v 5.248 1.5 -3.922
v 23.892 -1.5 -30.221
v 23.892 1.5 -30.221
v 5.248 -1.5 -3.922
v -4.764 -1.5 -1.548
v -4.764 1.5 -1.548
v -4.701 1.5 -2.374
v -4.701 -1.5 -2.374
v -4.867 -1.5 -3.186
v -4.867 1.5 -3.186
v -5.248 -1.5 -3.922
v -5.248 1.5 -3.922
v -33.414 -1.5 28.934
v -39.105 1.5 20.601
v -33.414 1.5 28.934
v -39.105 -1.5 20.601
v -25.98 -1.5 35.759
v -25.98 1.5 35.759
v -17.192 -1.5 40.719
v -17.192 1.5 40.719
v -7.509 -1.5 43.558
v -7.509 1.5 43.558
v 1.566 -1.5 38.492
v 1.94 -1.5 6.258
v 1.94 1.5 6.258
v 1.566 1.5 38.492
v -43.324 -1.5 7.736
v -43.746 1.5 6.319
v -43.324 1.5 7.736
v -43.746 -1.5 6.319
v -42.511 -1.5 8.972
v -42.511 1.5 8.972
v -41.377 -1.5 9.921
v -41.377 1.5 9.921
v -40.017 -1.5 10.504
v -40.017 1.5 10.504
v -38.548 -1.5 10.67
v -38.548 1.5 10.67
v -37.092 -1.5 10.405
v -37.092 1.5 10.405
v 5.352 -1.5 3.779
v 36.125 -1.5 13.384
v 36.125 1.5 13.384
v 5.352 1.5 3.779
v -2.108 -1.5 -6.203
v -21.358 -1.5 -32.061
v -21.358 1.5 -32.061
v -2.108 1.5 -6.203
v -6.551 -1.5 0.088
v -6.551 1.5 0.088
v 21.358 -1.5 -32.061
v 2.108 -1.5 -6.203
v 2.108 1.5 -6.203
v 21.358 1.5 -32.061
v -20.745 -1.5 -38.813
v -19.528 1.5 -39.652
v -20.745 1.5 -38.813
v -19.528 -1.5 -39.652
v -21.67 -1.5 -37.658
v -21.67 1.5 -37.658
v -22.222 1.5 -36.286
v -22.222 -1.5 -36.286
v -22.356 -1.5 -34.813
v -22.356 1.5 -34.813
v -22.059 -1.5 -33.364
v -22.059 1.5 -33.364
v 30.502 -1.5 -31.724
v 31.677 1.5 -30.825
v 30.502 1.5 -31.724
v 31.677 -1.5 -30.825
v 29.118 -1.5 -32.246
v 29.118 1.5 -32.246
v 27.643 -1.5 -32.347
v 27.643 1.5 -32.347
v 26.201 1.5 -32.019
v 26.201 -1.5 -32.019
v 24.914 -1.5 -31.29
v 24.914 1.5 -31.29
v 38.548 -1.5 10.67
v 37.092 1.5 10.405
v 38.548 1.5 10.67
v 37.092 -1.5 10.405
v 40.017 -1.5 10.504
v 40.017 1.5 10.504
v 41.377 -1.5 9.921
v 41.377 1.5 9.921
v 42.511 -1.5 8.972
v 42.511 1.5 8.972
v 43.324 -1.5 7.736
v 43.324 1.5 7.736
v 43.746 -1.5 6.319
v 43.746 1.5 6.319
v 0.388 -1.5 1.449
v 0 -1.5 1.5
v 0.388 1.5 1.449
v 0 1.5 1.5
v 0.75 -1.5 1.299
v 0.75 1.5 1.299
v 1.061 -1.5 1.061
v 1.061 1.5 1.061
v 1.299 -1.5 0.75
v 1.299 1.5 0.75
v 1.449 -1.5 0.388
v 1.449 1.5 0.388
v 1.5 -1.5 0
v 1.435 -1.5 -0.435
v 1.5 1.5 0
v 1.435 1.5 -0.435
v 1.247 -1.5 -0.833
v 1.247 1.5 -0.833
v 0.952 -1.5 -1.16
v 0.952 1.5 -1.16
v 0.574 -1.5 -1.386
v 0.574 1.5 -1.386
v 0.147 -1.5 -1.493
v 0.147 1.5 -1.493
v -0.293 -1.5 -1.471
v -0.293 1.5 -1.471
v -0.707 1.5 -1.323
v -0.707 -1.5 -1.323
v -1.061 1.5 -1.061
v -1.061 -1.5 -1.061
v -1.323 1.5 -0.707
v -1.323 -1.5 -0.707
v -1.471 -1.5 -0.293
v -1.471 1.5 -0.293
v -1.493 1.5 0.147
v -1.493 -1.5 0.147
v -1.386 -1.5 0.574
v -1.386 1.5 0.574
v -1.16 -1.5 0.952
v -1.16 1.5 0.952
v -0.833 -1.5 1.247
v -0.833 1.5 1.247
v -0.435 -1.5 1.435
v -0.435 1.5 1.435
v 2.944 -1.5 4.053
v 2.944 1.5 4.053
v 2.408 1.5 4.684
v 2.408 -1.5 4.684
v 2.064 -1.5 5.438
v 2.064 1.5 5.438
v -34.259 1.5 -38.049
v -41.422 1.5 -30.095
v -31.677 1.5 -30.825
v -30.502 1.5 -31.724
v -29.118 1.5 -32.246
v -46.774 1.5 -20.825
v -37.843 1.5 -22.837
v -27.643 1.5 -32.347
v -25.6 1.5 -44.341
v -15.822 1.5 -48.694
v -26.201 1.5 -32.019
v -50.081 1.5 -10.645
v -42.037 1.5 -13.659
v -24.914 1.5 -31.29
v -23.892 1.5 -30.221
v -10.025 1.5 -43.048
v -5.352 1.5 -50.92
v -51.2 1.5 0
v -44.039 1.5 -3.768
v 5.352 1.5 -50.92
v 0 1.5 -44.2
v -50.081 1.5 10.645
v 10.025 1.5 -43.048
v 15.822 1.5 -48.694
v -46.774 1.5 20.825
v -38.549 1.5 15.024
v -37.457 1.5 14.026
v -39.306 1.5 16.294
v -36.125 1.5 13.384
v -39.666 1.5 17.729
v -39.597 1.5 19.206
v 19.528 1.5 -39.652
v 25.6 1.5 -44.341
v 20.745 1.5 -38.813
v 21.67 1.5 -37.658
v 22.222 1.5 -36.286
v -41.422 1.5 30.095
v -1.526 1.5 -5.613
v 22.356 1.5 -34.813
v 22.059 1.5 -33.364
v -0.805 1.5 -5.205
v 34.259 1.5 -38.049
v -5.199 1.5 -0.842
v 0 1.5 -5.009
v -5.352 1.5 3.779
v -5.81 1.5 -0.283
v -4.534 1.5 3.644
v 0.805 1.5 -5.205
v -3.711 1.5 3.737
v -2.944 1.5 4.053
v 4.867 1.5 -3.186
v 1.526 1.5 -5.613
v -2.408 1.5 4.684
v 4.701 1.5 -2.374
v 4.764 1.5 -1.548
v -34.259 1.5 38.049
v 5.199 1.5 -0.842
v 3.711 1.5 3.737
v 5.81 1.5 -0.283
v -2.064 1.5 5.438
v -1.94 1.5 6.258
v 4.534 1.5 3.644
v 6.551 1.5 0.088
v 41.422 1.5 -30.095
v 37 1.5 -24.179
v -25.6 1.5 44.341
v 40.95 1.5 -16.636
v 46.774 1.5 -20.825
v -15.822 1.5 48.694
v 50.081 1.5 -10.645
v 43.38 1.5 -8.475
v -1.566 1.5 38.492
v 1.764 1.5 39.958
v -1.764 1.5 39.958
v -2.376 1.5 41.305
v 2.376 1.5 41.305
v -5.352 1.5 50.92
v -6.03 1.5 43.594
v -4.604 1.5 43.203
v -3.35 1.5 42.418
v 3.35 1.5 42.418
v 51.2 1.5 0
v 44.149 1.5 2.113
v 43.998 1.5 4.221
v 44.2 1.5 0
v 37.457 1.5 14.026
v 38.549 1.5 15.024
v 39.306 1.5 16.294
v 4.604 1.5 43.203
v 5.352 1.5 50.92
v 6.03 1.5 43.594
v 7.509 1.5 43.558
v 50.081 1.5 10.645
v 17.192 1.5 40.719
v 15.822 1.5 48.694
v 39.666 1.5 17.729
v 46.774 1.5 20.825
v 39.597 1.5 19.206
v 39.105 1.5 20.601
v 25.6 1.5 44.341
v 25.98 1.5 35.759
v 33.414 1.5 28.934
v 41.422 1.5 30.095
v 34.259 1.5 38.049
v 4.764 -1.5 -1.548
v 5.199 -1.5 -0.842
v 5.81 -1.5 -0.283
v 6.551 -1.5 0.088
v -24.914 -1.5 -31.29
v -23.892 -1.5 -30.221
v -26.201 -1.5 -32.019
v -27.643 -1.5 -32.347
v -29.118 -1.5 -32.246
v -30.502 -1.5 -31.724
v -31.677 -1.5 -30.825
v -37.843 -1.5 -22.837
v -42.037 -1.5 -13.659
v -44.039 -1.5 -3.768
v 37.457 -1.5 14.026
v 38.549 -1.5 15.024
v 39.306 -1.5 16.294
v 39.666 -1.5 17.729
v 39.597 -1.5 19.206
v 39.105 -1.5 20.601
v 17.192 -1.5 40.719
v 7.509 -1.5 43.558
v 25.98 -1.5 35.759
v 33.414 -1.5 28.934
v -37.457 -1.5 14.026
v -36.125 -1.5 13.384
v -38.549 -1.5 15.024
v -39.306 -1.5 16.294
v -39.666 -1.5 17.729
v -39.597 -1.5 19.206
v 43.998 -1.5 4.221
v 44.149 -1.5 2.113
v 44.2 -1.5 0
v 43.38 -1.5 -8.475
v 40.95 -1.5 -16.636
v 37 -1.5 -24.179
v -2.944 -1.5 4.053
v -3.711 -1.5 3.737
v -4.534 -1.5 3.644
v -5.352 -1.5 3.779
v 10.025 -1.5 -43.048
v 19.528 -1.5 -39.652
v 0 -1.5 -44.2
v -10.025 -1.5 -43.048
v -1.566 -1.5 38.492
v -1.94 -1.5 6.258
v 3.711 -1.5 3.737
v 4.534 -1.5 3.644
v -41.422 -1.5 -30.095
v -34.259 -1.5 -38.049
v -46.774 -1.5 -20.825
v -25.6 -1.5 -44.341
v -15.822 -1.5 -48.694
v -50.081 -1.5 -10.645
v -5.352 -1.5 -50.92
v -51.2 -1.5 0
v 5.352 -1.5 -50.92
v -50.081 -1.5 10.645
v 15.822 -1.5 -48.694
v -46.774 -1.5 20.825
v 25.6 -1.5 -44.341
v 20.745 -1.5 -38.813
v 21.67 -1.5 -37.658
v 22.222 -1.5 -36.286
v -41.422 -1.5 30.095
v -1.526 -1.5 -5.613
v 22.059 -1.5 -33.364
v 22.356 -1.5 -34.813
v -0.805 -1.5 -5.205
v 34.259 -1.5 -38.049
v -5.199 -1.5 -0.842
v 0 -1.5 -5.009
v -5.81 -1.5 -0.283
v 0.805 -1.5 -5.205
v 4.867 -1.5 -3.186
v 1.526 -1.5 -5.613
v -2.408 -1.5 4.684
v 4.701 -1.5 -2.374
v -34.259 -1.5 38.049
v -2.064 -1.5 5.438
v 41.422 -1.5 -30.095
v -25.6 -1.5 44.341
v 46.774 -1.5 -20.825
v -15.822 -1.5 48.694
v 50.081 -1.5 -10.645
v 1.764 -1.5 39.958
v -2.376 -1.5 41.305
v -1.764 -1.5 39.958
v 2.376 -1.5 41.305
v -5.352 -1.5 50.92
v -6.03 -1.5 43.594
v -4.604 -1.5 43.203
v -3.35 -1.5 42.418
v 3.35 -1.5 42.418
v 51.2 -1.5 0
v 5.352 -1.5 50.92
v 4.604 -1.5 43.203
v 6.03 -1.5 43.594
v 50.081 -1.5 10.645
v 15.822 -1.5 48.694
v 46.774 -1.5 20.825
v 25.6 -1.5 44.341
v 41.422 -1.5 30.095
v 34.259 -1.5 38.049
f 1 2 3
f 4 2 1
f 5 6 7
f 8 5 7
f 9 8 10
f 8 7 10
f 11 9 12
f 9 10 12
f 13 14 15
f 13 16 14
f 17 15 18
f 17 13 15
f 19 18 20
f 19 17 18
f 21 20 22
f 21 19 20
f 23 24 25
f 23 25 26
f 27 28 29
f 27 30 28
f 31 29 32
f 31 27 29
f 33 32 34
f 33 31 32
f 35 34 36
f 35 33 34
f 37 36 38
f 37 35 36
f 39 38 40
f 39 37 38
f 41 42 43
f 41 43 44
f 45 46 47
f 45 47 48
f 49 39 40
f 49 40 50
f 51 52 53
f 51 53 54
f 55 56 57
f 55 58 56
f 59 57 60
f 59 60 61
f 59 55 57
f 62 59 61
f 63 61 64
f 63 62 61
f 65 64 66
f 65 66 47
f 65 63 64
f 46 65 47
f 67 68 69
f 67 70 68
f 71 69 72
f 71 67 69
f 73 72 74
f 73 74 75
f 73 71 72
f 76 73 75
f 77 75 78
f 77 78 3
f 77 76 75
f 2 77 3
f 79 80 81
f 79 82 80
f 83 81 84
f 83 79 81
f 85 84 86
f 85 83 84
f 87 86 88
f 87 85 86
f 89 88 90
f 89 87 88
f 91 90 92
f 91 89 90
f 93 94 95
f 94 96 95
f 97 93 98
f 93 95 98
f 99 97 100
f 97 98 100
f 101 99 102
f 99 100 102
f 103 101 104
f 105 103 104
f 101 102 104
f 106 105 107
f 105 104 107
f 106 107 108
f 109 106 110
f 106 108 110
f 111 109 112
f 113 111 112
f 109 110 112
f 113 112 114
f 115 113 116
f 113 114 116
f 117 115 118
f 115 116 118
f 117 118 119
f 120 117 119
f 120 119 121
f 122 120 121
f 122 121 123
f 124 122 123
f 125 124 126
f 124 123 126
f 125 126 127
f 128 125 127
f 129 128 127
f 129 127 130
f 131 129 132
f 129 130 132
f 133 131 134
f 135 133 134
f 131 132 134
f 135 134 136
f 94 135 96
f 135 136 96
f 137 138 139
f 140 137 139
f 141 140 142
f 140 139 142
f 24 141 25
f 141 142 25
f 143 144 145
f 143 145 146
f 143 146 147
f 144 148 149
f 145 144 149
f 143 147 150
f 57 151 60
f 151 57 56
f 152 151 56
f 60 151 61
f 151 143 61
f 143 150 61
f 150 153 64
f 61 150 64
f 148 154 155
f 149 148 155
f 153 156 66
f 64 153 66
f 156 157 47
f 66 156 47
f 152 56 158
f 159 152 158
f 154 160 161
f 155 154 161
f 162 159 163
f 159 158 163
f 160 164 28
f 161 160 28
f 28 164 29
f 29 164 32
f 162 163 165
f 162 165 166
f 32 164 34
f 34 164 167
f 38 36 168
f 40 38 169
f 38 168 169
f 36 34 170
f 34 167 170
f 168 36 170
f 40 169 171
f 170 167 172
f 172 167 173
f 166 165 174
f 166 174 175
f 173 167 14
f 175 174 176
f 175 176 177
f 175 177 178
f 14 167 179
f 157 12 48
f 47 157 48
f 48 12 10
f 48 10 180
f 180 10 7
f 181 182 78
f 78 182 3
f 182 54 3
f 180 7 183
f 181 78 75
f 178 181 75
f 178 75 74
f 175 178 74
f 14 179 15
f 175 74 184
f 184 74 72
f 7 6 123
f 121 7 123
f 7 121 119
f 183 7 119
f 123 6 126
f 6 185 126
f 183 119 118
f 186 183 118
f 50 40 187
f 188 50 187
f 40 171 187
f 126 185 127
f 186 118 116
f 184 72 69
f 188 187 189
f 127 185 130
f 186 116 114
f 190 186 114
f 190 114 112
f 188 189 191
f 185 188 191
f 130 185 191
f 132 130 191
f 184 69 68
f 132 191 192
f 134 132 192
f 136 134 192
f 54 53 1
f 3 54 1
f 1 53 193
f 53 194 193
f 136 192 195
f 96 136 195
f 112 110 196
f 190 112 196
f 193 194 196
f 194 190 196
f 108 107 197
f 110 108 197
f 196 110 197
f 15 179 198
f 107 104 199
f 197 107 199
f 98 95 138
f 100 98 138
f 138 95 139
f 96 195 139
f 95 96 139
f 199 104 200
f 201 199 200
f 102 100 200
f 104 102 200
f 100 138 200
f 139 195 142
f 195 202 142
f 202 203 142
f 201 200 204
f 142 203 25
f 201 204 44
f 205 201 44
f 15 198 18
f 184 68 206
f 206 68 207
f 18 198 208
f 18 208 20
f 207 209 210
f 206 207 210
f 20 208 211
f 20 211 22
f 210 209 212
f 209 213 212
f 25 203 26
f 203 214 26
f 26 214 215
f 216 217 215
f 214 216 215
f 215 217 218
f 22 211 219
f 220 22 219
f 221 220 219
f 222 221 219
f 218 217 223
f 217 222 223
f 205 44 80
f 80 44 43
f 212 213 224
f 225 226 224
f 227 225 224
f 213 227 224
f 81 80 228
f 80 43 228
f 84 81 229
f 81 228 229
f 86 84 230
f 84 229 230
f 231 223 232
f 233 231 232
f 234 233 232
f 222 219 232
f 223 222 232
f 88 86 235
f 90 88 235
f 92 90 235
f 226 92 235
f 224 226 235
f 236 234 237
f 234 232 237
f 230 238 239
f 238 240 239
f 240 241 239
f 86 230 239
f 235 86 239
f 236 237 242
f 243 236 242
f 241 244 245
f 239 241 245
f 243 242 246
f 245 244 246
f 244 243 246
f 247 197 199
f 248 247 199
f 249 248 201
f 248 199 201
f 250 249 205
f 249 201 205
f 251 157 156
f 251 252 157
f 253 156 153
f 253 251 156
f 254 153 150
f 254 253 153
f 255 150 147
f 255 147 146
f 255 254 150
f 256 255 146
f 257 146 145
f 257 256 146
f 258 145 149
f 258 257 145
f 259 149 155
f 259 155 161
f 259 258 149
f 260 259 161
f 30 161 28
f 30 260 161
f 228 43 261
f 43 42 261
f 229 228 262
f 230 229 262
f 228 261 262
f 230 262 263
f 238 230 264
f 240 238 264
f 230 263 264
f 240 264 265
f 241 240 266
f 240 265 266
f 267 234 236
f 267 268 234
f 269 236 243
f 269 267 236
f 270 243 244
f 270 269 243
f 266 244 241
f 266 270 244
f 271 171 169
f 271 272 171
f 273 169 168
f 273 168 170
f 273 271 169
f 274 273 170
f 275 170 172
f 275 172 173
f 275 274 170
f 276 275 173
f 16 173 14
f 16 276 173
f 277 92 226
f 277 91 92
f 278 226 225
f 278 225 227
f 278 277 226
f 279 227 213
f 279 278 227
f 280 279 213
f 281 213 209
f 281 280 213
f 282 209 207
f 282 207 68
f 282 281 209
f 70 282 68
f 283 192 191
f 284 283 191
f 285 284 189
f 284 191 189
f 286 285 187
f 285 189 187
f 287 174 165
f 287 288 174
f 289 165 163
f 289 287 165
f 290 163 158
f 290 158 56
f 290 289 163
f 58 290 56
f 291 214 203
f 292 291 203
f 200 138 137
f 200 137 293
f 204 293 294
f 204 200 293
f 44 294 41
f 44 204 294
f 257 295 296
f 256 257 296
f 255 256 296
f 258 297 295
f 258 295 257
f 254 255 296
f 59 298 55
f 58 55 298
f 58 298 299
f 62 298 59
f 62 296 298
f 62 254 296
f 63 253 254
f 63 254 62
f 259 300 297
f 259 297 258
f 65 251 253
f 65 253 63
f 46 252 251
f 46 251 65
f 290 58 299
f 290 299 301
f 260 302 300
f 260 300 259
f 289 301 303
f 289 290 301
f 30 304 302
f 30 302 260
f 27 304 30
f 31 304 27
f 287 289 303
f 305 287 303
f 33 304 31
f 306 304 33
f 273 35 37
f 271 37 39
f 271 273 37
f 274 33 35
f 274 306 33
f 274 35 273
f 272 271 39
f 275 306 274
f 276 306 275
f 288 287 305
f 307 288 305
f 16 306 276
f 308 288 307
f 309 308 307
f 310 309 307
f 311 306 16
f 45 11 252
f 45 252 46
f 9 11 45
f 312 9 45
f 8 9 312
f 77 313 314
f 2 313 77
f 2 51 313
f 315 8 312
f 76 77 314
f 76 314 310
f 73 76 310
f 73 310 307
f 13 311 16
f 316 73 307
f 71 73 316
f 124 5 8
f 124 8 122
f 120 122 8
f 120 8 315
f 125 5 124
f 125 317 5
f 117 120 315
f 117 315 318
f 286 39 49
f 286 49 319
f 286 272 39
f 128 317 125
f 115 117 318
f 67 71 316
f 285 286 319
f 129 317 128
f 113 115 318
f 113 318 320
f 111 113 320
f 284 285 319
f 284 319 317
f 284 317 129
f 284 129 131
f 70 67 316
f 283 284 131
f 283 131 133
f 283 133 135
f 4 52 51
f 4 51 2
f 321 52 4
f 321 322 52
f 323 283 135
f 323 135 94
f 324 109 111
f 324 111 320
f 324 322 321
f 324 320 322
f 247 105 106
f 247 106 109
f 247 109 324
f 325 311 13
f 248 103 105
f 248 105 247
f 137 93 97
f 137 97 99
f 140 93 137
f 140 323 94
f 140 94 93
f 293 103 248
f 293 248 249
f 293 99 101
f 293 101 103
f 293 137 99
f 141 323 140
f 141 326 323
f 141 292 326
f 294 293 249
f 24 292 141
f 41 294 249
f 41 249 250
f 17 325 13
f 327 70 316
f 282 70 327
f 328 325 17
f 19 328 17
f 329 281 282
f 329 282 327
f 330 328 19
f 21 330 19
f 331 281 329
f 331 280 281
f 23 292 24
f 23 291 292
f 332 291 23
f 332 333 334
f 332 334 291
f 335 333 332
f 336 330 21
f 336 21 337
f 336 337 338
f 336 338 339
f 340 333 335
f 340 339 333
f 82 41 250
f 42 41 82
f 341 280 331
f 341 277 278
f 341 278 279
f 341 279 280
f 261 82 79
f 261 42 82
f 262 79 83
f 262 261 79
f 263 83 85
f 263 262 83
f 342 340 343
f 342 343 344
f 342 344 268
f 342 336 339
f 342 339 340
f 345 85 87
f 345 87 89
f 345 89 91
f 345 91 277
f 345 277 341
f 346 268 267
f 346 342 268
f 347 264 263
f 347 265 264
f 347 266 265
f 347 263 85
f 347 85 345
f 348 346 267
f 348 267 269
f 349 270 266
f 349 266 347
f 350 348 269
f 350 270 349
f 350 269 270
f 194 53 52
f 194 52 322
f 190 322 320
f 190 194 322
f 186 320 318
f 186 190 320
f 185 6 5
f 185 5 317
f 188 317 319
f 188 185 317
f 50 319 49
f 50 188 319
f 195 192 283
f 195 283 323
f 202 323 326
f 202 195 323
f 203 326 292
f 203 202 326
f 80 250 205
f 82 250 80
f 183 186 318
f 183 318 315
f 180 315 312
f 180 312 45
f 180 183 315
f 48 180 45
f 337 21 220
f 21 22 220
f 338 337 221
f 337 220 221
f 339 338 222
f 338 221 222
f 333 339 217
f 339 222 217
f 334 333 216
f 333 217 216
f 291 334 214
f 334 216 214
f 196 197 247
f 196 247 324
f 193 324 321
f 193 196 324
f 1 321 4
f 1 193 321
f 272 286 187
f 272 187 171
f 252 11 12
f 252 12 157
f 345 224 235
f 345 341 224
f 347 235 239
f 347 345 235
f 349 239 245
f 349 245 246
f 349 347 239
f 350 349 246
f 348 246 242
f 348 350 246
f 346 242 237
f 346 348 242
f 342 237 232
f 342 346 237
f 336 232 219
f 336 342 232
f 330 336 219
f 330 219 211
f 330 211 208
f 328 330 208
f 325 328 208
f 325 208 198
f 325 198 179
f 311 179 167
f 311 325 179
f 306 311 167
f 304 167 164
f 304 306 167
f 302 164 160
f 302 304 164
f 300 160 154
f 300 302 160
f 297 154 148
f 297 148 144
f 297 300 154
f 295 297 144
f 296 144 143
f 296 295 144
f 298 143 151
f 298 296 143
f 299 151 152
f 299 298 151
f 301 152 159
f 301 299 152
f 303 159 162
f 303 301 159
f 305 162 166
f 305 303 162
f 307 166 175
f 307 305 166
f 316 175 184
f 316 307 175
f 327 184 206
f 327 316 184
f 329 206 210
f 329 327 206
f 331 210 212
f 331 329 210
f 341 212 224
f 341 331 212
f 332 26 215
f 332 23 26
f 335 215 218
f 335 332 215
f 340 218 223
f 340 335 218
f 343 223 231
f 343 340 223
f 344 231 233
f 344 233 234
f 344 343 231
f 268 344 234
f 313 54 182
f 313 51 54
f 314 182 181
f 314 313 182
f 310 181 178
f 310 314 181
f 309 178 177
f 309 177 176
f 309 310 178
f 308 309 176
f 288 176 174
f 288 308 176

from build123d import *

# Parameters (mm, degrees)
F0_R        = 51.2
F1_DEPTH    = 1.5
F2_T1_DEPTH = 3
F3_R        = 5.08


# Not quite as in the source:
# - a fillet or chamfer that OpenCascade refuses, or shapes differently, is made with other operations: its cross-section is extruded or revolved along the edge and cut away or added


with BuildPart() as f1:
    # F0 (on Front) → F1 (new body, symmetric)
    with BuildSketch(Plane.XZ):
        Circle(F0_R)
        with BuildLine():
            ThreePointArc((1.5, 44.1745401787), (25.9801081513, 35.7585511514), (41.5489587997, 15.0772684084))
            ThreePointArc((41.5489587997, 15.0772684084), (42.0366980202, 13.6585511514), (42.4760097829, 12.2240988595))
            ThreePointArc((42.4760097829, 12.2240988595), (43.7668803572, 6.1725346333), (44.2, 0))
            ThreePointArc((44.2, 0), (39.7173586616, -19.3951391062), (27.1786687354, -34.8562758448))
            ThreePointArc((27.1786687354, -34.8562758448), (25.9801081513, -35.7585511514), (24.7516177523, -36.6196316017))
            ThreePointArc((24.7516177523, -36.6196316017), (0, -44.2), (-24.7516177523, -36.6196316017))
            ThreePointArc((-24.7516177523, -36.6196316017), (-25.9801081513, -35.7585511514), (-27.1786687354, -34.8562758448))
            ThreePointArc((-27.1786687354, -34.8562758448), (-42.0366980202, -13.6585511514), (-42.4760097829, 12.2240988595))
            ThreePointArc((-42.4760097829, 12.2240988595), (-42.0366980202, 13.6585511514), (-41.5489587997, 15.0772684084))
            ThreePointArc((-41.5489587997, 15.0772684084), (-25.9801081513, 35.7585511514), (-1.5, 44.1745401787))
            ThreePointArc((-1.5, 44.1745401787), (0, 44.2), (1.5, 44.1745401787))
        make_face(mode=Mode.SUBTRACT)
        with BuildLine():
            Line((-24.7516177523, -36.6196316017), (-1.118469097, -4.8732973313))
            ThreePointArc((-1.118469097, -4.8732973313), (-2.9389262615, -4.0450849719), (-4.2891552241, -2.569659017))
            Line((-4.2891552241, -2.569659017), (-27.1786687354, -34.8562758448))
            ThreePointArc((-27.1786687354, -34.8562758448), (-25.9801081513, -35.7585511514), (-24.7516177523, -36.6196316017))
        make_face()
        with BuildLine():
            ThreePointArc((-4.9804071414, -0.4422043711), (-4.7552825815, 1.5450849719), (-3.7693128085, 3.2851607193))
            Line((-3.7693128085, 3.2851607193), (-41.5489587997, 15.0772684084))
            ThreePointArc((-41.5489587997, 15.0772684084), (-42.0366980202, 13.6585511514), (-42.4760097829, 12.2240988595))
            Line((-42.4760097829, 12.2240988595), (-4.9804071414, -0.4422043711))
        make_face()
        with BuildLine():
            ThreePointArc((-1.9595917942, 4.6), (0, 5), (1.9595917942, 4.6))
            Line((1.9595917942, 4.6), (1.5, 44.1745401787))
            ThreePointArc((1.5, 44.1745401787), (0, 44.2), (-1.5, 44.1745401787))
            Line((-1.5, 44.1745401787), (-1.9595917942, 4.6))
        make_face()
        with BuildLine():
            ThreePointArc((3.7693128085, 3.2851607193), (4.6822304537, 1.7540575757), (5, 0))
            ThreePointArc((5, 0), (4.9950993837, -0.2213191055), (4.9804071414, -0.4422043711))
            Line((4.9804071414, -0.4422043711), (42.4760097829, 12.2240988595))
            ThreePointArc((42.4760097829, 12.2240988595), (42.0366980202, 13.6585511514), (41.5489587997, 15.0772684084))
            Line((41.5489587997, 15.0772684084), (3.7693128085, 3.2851607193))
        make_face()
        with BuildLine():
            Line((27.1786687354, -34.8562758448), (4.2891552241, -2.569659017))
            ThreePointArc((4.2891552241, -2.569659017), (2.9389262615, -4.0450849719), (1.118469097, -4.8732973313))
            Line((1.118469097, -4.8732973313), (24.7516177523, -36.6196316017))
            ThreePointArc((24.7516177523, -36.6196316017), (25.9801081513, -35.7585511514), (27.1786687354, -34.8562758448))
        make_face()
        with BuildLine():
            ThreePointArc((4.9804071414, -0.4422043711), (4.9950993837, -0.2213191055), (5, 0))
            ThreePointArc((5, 0), (4.6822304537, 1.7540575757), (3.7693128085, 3.2851607193))
            ThreePointArc((3.7693128085, 3.2851607193), (2.9389262615, 4.0450849719), (1.9595917942, 4.6))
            ThreePointArc((1.9595917942, 4.6), (0, 5), (-1.9595917942, 4.6))
            ThreePointArc((-1.9595917942, 4.6), (-2.9389262615, 4.0450849719), (-3.7693128085, 3.2851607193))
            ThreePointArc((-3.7693128085, 3.2851607193), (-4.7552825815, 1.5450849719), (-4.9804071414, -0.4422043711))
            ThreePointArc((-4.9804071414, -0.4422043711), (-4.7552825815, -1.5450849719), (-4.2891552241, -2.569659017))
            ThreePointArc((-4.2891552241, -2.569659017), (-2.9389262615, -4.0450849719), (-1.118469097, -4.8732973313))
            ThreePointArc((-1.118469097, -4.8732973313), (0, -5), (1.118469097, -4.8732973313))
            ThreePointArc((1.118469097, -4.8732973313), (2.9389262615, -4.0450849719), (4.2891552241, -2.569659017))
            ThreePointArc((4.2891552241, -2.569659017), (4.7552825815, -1.5450849719), (4.9804071414, -0.4422043711))
        make_face()
        with BuildLine():
            ThreePointArc((0, 1.5), (1.0606601718, 1.0606601718), (1.5, 0))
            ThreePointArc((1.5, 0), (-1.0606601718, -1.0606601718), (0, 1.5))
        make_face(mode=Mode.SUBTRACT)
    extrude(amount=F1_DEPTH, both=True)

    # F2: fillet of radius 3 on 10 edges, made by hand

    # F2_s2 → F2_t1 (join)
    with BuildSketch(Plane.XZ.offset(-1.5)):
        with BuildLine():
            ThreePointArc((3.0875868977, 3.9327861815), (2.2498717307, 4.9648804635), (1.9403413197, 6.2576202799))
            Line((1.9403413197, 6.2576202799), (1.9595917942, 4.6))
            ThreePointArc((1.9595917942, 4.6), (2.5455444913, 4.303510572), (3.0875868977, 3.9327861815))
        make_face()
        with BuildLine():
            ThreePointArc((2.7861851021, 4.151767404), (4.0266333175, 3.6739876086), (5.351752101, 3.7790852667))
            Line((5.351752101, 3.7790852667), (3.7693128085, 3.2851607193))
            ThreePointArc((3.7693128085, 3.2851607193), (3.3062652647, 3.7508145781), (2.7861851021, 4.151767404))
        make_face()
        with BuildLine():
            ThreePointArc((-2.7861851021, 4.151767404), (-4.0266333175, 3.6739876086), (-5.351752101, 3.7790852667))
            Line((-5.351752101, 3.7790852667), (-3.7693128085, 3.2851607193))
            ThreePointArc((-3.7693128085, 3.2851607193), (-3.3062652647, 3.7508145781), (-2.7861851021, 4.151767404))
        make_face()
        with BuildLine():
            ThreePointArc((-3.0875868977, 3.9327861815), (-2.2498717307, 4.9648804635), (-1.9403413197, 6.2576202799))
            Line((-1.9403413197, 6.2576202799), (-1.9595917942, 4.6))
            ThreePointArc((-1.9595917942, 4.6), (-2.5455444913, 4.303510572), (-3.0875868977, 3.9327861815))
        make_face()
        with BuildLine():
            ThreePointArc((-4.6944187481, -1.7211718734), (-5.4171305174, -0.605522732), (-6.5509489863, 0.0883367549))
            Line((-6.5509489863, 0.0883367549), (-4.9804071414, -0.4422043711))
            ThreePointArc((-4.9804071414, -0.4422043711), (-4.8794982801, -1.0910987737), (-4.6944187481, -1.7211718734))
        make_face()
        with BuildLine():
            ThreePointArc((-4.8095439897, -1.3668528124), (-4.7384679811, -2.6942312472), (-5.2479060175, -3.9220171386))
            Line((-5.2479060175, -3.9220171386), (-4.2891552241, -2.569659017))
            ThreePointArc((-4.2891552241, -2.569659017), (-4.5889288007, -1.9853796772), (-4.8095439897, -1.3668528124))
        make_face()
        with BuildLine():
            ThreePointArc((4.6944187481, -1.7211718734), (5.4171305174, -0.605522732), (6.5509489863, 0.0883367549))
            Line((6.5509489863, 0.0883367549), (4.9804071414, -0.4422043711))
            ThreePointArc((4.9804071414, -0.4422043711), (4.8794982801, -1.0910987737), (4.6944187481, -1.7211718734))
        make_face()
        with BuildLine():
            ThreePointArc((4.8095439897, -1.3668528124), (4.7384679811, -2.6942312472), (5.2479060175, -3.9220171386))
            Line((5.2479060175, -3.9220171386), (4.2891552241, -2.569659017))
            ThreePointArc((4.2891552241, -2.569659017), (4.5889288007, -1.9853796772), (4.8095439897, -1.3668528124))
        make_face()
        with BuildLine():
            ThreePointArc((0.186276554, -4.9965288997), (-1.0980990506, -5.3391140929), (-2.1083678125, -6.2030251629))
            Line((-2.1083678125, -6.2030251629), (-1.118469097, -4.8732973313))
            ThreePointArc((-1.118469097, -4.8732973313), (-0.4701512939, -4.9778466992), (0.186276554, -4.9965288997))
        make_face()
        with BuildLine():
            ThreePointArc((2.1083678125, -6.2030251629), (1.0980990506, -5.3391140929), (-0.186276554, -4.9965288997))
            ThreePointArc((-0.186276554, -4.9965288997), (0.4701512939, -4.9778466992), (1.118469097, -4.8732973313))
            Line((1.118469097, -4.8732973313), (2.1083678125, -6.2030251629))
        make_face()
    extrude(amount=F2_T1_DEPTH)

    # F3
    f3_edges = [f1.edges().sort_by_distance(p)[0] for p in [
        (-42.47601, 0, 12.224099),
        (42.47601, 0, 12.224099),
        (-1.5, 0, 44.17454),
        (24.751618, 0, -36.619632),
        (27.178669, 0, -34.856276),
        (41.548959, 0, 15.077268),
        (1.5, 0, 44.17454),
        (-41.548959, 0, 15.077268),
        (-27.178669, 0, -34.856276),
        (-24.751618, 0, -36.619632),
    ]]
    fillet(f3_edges, radius=F3_R)


solid = f1.part
